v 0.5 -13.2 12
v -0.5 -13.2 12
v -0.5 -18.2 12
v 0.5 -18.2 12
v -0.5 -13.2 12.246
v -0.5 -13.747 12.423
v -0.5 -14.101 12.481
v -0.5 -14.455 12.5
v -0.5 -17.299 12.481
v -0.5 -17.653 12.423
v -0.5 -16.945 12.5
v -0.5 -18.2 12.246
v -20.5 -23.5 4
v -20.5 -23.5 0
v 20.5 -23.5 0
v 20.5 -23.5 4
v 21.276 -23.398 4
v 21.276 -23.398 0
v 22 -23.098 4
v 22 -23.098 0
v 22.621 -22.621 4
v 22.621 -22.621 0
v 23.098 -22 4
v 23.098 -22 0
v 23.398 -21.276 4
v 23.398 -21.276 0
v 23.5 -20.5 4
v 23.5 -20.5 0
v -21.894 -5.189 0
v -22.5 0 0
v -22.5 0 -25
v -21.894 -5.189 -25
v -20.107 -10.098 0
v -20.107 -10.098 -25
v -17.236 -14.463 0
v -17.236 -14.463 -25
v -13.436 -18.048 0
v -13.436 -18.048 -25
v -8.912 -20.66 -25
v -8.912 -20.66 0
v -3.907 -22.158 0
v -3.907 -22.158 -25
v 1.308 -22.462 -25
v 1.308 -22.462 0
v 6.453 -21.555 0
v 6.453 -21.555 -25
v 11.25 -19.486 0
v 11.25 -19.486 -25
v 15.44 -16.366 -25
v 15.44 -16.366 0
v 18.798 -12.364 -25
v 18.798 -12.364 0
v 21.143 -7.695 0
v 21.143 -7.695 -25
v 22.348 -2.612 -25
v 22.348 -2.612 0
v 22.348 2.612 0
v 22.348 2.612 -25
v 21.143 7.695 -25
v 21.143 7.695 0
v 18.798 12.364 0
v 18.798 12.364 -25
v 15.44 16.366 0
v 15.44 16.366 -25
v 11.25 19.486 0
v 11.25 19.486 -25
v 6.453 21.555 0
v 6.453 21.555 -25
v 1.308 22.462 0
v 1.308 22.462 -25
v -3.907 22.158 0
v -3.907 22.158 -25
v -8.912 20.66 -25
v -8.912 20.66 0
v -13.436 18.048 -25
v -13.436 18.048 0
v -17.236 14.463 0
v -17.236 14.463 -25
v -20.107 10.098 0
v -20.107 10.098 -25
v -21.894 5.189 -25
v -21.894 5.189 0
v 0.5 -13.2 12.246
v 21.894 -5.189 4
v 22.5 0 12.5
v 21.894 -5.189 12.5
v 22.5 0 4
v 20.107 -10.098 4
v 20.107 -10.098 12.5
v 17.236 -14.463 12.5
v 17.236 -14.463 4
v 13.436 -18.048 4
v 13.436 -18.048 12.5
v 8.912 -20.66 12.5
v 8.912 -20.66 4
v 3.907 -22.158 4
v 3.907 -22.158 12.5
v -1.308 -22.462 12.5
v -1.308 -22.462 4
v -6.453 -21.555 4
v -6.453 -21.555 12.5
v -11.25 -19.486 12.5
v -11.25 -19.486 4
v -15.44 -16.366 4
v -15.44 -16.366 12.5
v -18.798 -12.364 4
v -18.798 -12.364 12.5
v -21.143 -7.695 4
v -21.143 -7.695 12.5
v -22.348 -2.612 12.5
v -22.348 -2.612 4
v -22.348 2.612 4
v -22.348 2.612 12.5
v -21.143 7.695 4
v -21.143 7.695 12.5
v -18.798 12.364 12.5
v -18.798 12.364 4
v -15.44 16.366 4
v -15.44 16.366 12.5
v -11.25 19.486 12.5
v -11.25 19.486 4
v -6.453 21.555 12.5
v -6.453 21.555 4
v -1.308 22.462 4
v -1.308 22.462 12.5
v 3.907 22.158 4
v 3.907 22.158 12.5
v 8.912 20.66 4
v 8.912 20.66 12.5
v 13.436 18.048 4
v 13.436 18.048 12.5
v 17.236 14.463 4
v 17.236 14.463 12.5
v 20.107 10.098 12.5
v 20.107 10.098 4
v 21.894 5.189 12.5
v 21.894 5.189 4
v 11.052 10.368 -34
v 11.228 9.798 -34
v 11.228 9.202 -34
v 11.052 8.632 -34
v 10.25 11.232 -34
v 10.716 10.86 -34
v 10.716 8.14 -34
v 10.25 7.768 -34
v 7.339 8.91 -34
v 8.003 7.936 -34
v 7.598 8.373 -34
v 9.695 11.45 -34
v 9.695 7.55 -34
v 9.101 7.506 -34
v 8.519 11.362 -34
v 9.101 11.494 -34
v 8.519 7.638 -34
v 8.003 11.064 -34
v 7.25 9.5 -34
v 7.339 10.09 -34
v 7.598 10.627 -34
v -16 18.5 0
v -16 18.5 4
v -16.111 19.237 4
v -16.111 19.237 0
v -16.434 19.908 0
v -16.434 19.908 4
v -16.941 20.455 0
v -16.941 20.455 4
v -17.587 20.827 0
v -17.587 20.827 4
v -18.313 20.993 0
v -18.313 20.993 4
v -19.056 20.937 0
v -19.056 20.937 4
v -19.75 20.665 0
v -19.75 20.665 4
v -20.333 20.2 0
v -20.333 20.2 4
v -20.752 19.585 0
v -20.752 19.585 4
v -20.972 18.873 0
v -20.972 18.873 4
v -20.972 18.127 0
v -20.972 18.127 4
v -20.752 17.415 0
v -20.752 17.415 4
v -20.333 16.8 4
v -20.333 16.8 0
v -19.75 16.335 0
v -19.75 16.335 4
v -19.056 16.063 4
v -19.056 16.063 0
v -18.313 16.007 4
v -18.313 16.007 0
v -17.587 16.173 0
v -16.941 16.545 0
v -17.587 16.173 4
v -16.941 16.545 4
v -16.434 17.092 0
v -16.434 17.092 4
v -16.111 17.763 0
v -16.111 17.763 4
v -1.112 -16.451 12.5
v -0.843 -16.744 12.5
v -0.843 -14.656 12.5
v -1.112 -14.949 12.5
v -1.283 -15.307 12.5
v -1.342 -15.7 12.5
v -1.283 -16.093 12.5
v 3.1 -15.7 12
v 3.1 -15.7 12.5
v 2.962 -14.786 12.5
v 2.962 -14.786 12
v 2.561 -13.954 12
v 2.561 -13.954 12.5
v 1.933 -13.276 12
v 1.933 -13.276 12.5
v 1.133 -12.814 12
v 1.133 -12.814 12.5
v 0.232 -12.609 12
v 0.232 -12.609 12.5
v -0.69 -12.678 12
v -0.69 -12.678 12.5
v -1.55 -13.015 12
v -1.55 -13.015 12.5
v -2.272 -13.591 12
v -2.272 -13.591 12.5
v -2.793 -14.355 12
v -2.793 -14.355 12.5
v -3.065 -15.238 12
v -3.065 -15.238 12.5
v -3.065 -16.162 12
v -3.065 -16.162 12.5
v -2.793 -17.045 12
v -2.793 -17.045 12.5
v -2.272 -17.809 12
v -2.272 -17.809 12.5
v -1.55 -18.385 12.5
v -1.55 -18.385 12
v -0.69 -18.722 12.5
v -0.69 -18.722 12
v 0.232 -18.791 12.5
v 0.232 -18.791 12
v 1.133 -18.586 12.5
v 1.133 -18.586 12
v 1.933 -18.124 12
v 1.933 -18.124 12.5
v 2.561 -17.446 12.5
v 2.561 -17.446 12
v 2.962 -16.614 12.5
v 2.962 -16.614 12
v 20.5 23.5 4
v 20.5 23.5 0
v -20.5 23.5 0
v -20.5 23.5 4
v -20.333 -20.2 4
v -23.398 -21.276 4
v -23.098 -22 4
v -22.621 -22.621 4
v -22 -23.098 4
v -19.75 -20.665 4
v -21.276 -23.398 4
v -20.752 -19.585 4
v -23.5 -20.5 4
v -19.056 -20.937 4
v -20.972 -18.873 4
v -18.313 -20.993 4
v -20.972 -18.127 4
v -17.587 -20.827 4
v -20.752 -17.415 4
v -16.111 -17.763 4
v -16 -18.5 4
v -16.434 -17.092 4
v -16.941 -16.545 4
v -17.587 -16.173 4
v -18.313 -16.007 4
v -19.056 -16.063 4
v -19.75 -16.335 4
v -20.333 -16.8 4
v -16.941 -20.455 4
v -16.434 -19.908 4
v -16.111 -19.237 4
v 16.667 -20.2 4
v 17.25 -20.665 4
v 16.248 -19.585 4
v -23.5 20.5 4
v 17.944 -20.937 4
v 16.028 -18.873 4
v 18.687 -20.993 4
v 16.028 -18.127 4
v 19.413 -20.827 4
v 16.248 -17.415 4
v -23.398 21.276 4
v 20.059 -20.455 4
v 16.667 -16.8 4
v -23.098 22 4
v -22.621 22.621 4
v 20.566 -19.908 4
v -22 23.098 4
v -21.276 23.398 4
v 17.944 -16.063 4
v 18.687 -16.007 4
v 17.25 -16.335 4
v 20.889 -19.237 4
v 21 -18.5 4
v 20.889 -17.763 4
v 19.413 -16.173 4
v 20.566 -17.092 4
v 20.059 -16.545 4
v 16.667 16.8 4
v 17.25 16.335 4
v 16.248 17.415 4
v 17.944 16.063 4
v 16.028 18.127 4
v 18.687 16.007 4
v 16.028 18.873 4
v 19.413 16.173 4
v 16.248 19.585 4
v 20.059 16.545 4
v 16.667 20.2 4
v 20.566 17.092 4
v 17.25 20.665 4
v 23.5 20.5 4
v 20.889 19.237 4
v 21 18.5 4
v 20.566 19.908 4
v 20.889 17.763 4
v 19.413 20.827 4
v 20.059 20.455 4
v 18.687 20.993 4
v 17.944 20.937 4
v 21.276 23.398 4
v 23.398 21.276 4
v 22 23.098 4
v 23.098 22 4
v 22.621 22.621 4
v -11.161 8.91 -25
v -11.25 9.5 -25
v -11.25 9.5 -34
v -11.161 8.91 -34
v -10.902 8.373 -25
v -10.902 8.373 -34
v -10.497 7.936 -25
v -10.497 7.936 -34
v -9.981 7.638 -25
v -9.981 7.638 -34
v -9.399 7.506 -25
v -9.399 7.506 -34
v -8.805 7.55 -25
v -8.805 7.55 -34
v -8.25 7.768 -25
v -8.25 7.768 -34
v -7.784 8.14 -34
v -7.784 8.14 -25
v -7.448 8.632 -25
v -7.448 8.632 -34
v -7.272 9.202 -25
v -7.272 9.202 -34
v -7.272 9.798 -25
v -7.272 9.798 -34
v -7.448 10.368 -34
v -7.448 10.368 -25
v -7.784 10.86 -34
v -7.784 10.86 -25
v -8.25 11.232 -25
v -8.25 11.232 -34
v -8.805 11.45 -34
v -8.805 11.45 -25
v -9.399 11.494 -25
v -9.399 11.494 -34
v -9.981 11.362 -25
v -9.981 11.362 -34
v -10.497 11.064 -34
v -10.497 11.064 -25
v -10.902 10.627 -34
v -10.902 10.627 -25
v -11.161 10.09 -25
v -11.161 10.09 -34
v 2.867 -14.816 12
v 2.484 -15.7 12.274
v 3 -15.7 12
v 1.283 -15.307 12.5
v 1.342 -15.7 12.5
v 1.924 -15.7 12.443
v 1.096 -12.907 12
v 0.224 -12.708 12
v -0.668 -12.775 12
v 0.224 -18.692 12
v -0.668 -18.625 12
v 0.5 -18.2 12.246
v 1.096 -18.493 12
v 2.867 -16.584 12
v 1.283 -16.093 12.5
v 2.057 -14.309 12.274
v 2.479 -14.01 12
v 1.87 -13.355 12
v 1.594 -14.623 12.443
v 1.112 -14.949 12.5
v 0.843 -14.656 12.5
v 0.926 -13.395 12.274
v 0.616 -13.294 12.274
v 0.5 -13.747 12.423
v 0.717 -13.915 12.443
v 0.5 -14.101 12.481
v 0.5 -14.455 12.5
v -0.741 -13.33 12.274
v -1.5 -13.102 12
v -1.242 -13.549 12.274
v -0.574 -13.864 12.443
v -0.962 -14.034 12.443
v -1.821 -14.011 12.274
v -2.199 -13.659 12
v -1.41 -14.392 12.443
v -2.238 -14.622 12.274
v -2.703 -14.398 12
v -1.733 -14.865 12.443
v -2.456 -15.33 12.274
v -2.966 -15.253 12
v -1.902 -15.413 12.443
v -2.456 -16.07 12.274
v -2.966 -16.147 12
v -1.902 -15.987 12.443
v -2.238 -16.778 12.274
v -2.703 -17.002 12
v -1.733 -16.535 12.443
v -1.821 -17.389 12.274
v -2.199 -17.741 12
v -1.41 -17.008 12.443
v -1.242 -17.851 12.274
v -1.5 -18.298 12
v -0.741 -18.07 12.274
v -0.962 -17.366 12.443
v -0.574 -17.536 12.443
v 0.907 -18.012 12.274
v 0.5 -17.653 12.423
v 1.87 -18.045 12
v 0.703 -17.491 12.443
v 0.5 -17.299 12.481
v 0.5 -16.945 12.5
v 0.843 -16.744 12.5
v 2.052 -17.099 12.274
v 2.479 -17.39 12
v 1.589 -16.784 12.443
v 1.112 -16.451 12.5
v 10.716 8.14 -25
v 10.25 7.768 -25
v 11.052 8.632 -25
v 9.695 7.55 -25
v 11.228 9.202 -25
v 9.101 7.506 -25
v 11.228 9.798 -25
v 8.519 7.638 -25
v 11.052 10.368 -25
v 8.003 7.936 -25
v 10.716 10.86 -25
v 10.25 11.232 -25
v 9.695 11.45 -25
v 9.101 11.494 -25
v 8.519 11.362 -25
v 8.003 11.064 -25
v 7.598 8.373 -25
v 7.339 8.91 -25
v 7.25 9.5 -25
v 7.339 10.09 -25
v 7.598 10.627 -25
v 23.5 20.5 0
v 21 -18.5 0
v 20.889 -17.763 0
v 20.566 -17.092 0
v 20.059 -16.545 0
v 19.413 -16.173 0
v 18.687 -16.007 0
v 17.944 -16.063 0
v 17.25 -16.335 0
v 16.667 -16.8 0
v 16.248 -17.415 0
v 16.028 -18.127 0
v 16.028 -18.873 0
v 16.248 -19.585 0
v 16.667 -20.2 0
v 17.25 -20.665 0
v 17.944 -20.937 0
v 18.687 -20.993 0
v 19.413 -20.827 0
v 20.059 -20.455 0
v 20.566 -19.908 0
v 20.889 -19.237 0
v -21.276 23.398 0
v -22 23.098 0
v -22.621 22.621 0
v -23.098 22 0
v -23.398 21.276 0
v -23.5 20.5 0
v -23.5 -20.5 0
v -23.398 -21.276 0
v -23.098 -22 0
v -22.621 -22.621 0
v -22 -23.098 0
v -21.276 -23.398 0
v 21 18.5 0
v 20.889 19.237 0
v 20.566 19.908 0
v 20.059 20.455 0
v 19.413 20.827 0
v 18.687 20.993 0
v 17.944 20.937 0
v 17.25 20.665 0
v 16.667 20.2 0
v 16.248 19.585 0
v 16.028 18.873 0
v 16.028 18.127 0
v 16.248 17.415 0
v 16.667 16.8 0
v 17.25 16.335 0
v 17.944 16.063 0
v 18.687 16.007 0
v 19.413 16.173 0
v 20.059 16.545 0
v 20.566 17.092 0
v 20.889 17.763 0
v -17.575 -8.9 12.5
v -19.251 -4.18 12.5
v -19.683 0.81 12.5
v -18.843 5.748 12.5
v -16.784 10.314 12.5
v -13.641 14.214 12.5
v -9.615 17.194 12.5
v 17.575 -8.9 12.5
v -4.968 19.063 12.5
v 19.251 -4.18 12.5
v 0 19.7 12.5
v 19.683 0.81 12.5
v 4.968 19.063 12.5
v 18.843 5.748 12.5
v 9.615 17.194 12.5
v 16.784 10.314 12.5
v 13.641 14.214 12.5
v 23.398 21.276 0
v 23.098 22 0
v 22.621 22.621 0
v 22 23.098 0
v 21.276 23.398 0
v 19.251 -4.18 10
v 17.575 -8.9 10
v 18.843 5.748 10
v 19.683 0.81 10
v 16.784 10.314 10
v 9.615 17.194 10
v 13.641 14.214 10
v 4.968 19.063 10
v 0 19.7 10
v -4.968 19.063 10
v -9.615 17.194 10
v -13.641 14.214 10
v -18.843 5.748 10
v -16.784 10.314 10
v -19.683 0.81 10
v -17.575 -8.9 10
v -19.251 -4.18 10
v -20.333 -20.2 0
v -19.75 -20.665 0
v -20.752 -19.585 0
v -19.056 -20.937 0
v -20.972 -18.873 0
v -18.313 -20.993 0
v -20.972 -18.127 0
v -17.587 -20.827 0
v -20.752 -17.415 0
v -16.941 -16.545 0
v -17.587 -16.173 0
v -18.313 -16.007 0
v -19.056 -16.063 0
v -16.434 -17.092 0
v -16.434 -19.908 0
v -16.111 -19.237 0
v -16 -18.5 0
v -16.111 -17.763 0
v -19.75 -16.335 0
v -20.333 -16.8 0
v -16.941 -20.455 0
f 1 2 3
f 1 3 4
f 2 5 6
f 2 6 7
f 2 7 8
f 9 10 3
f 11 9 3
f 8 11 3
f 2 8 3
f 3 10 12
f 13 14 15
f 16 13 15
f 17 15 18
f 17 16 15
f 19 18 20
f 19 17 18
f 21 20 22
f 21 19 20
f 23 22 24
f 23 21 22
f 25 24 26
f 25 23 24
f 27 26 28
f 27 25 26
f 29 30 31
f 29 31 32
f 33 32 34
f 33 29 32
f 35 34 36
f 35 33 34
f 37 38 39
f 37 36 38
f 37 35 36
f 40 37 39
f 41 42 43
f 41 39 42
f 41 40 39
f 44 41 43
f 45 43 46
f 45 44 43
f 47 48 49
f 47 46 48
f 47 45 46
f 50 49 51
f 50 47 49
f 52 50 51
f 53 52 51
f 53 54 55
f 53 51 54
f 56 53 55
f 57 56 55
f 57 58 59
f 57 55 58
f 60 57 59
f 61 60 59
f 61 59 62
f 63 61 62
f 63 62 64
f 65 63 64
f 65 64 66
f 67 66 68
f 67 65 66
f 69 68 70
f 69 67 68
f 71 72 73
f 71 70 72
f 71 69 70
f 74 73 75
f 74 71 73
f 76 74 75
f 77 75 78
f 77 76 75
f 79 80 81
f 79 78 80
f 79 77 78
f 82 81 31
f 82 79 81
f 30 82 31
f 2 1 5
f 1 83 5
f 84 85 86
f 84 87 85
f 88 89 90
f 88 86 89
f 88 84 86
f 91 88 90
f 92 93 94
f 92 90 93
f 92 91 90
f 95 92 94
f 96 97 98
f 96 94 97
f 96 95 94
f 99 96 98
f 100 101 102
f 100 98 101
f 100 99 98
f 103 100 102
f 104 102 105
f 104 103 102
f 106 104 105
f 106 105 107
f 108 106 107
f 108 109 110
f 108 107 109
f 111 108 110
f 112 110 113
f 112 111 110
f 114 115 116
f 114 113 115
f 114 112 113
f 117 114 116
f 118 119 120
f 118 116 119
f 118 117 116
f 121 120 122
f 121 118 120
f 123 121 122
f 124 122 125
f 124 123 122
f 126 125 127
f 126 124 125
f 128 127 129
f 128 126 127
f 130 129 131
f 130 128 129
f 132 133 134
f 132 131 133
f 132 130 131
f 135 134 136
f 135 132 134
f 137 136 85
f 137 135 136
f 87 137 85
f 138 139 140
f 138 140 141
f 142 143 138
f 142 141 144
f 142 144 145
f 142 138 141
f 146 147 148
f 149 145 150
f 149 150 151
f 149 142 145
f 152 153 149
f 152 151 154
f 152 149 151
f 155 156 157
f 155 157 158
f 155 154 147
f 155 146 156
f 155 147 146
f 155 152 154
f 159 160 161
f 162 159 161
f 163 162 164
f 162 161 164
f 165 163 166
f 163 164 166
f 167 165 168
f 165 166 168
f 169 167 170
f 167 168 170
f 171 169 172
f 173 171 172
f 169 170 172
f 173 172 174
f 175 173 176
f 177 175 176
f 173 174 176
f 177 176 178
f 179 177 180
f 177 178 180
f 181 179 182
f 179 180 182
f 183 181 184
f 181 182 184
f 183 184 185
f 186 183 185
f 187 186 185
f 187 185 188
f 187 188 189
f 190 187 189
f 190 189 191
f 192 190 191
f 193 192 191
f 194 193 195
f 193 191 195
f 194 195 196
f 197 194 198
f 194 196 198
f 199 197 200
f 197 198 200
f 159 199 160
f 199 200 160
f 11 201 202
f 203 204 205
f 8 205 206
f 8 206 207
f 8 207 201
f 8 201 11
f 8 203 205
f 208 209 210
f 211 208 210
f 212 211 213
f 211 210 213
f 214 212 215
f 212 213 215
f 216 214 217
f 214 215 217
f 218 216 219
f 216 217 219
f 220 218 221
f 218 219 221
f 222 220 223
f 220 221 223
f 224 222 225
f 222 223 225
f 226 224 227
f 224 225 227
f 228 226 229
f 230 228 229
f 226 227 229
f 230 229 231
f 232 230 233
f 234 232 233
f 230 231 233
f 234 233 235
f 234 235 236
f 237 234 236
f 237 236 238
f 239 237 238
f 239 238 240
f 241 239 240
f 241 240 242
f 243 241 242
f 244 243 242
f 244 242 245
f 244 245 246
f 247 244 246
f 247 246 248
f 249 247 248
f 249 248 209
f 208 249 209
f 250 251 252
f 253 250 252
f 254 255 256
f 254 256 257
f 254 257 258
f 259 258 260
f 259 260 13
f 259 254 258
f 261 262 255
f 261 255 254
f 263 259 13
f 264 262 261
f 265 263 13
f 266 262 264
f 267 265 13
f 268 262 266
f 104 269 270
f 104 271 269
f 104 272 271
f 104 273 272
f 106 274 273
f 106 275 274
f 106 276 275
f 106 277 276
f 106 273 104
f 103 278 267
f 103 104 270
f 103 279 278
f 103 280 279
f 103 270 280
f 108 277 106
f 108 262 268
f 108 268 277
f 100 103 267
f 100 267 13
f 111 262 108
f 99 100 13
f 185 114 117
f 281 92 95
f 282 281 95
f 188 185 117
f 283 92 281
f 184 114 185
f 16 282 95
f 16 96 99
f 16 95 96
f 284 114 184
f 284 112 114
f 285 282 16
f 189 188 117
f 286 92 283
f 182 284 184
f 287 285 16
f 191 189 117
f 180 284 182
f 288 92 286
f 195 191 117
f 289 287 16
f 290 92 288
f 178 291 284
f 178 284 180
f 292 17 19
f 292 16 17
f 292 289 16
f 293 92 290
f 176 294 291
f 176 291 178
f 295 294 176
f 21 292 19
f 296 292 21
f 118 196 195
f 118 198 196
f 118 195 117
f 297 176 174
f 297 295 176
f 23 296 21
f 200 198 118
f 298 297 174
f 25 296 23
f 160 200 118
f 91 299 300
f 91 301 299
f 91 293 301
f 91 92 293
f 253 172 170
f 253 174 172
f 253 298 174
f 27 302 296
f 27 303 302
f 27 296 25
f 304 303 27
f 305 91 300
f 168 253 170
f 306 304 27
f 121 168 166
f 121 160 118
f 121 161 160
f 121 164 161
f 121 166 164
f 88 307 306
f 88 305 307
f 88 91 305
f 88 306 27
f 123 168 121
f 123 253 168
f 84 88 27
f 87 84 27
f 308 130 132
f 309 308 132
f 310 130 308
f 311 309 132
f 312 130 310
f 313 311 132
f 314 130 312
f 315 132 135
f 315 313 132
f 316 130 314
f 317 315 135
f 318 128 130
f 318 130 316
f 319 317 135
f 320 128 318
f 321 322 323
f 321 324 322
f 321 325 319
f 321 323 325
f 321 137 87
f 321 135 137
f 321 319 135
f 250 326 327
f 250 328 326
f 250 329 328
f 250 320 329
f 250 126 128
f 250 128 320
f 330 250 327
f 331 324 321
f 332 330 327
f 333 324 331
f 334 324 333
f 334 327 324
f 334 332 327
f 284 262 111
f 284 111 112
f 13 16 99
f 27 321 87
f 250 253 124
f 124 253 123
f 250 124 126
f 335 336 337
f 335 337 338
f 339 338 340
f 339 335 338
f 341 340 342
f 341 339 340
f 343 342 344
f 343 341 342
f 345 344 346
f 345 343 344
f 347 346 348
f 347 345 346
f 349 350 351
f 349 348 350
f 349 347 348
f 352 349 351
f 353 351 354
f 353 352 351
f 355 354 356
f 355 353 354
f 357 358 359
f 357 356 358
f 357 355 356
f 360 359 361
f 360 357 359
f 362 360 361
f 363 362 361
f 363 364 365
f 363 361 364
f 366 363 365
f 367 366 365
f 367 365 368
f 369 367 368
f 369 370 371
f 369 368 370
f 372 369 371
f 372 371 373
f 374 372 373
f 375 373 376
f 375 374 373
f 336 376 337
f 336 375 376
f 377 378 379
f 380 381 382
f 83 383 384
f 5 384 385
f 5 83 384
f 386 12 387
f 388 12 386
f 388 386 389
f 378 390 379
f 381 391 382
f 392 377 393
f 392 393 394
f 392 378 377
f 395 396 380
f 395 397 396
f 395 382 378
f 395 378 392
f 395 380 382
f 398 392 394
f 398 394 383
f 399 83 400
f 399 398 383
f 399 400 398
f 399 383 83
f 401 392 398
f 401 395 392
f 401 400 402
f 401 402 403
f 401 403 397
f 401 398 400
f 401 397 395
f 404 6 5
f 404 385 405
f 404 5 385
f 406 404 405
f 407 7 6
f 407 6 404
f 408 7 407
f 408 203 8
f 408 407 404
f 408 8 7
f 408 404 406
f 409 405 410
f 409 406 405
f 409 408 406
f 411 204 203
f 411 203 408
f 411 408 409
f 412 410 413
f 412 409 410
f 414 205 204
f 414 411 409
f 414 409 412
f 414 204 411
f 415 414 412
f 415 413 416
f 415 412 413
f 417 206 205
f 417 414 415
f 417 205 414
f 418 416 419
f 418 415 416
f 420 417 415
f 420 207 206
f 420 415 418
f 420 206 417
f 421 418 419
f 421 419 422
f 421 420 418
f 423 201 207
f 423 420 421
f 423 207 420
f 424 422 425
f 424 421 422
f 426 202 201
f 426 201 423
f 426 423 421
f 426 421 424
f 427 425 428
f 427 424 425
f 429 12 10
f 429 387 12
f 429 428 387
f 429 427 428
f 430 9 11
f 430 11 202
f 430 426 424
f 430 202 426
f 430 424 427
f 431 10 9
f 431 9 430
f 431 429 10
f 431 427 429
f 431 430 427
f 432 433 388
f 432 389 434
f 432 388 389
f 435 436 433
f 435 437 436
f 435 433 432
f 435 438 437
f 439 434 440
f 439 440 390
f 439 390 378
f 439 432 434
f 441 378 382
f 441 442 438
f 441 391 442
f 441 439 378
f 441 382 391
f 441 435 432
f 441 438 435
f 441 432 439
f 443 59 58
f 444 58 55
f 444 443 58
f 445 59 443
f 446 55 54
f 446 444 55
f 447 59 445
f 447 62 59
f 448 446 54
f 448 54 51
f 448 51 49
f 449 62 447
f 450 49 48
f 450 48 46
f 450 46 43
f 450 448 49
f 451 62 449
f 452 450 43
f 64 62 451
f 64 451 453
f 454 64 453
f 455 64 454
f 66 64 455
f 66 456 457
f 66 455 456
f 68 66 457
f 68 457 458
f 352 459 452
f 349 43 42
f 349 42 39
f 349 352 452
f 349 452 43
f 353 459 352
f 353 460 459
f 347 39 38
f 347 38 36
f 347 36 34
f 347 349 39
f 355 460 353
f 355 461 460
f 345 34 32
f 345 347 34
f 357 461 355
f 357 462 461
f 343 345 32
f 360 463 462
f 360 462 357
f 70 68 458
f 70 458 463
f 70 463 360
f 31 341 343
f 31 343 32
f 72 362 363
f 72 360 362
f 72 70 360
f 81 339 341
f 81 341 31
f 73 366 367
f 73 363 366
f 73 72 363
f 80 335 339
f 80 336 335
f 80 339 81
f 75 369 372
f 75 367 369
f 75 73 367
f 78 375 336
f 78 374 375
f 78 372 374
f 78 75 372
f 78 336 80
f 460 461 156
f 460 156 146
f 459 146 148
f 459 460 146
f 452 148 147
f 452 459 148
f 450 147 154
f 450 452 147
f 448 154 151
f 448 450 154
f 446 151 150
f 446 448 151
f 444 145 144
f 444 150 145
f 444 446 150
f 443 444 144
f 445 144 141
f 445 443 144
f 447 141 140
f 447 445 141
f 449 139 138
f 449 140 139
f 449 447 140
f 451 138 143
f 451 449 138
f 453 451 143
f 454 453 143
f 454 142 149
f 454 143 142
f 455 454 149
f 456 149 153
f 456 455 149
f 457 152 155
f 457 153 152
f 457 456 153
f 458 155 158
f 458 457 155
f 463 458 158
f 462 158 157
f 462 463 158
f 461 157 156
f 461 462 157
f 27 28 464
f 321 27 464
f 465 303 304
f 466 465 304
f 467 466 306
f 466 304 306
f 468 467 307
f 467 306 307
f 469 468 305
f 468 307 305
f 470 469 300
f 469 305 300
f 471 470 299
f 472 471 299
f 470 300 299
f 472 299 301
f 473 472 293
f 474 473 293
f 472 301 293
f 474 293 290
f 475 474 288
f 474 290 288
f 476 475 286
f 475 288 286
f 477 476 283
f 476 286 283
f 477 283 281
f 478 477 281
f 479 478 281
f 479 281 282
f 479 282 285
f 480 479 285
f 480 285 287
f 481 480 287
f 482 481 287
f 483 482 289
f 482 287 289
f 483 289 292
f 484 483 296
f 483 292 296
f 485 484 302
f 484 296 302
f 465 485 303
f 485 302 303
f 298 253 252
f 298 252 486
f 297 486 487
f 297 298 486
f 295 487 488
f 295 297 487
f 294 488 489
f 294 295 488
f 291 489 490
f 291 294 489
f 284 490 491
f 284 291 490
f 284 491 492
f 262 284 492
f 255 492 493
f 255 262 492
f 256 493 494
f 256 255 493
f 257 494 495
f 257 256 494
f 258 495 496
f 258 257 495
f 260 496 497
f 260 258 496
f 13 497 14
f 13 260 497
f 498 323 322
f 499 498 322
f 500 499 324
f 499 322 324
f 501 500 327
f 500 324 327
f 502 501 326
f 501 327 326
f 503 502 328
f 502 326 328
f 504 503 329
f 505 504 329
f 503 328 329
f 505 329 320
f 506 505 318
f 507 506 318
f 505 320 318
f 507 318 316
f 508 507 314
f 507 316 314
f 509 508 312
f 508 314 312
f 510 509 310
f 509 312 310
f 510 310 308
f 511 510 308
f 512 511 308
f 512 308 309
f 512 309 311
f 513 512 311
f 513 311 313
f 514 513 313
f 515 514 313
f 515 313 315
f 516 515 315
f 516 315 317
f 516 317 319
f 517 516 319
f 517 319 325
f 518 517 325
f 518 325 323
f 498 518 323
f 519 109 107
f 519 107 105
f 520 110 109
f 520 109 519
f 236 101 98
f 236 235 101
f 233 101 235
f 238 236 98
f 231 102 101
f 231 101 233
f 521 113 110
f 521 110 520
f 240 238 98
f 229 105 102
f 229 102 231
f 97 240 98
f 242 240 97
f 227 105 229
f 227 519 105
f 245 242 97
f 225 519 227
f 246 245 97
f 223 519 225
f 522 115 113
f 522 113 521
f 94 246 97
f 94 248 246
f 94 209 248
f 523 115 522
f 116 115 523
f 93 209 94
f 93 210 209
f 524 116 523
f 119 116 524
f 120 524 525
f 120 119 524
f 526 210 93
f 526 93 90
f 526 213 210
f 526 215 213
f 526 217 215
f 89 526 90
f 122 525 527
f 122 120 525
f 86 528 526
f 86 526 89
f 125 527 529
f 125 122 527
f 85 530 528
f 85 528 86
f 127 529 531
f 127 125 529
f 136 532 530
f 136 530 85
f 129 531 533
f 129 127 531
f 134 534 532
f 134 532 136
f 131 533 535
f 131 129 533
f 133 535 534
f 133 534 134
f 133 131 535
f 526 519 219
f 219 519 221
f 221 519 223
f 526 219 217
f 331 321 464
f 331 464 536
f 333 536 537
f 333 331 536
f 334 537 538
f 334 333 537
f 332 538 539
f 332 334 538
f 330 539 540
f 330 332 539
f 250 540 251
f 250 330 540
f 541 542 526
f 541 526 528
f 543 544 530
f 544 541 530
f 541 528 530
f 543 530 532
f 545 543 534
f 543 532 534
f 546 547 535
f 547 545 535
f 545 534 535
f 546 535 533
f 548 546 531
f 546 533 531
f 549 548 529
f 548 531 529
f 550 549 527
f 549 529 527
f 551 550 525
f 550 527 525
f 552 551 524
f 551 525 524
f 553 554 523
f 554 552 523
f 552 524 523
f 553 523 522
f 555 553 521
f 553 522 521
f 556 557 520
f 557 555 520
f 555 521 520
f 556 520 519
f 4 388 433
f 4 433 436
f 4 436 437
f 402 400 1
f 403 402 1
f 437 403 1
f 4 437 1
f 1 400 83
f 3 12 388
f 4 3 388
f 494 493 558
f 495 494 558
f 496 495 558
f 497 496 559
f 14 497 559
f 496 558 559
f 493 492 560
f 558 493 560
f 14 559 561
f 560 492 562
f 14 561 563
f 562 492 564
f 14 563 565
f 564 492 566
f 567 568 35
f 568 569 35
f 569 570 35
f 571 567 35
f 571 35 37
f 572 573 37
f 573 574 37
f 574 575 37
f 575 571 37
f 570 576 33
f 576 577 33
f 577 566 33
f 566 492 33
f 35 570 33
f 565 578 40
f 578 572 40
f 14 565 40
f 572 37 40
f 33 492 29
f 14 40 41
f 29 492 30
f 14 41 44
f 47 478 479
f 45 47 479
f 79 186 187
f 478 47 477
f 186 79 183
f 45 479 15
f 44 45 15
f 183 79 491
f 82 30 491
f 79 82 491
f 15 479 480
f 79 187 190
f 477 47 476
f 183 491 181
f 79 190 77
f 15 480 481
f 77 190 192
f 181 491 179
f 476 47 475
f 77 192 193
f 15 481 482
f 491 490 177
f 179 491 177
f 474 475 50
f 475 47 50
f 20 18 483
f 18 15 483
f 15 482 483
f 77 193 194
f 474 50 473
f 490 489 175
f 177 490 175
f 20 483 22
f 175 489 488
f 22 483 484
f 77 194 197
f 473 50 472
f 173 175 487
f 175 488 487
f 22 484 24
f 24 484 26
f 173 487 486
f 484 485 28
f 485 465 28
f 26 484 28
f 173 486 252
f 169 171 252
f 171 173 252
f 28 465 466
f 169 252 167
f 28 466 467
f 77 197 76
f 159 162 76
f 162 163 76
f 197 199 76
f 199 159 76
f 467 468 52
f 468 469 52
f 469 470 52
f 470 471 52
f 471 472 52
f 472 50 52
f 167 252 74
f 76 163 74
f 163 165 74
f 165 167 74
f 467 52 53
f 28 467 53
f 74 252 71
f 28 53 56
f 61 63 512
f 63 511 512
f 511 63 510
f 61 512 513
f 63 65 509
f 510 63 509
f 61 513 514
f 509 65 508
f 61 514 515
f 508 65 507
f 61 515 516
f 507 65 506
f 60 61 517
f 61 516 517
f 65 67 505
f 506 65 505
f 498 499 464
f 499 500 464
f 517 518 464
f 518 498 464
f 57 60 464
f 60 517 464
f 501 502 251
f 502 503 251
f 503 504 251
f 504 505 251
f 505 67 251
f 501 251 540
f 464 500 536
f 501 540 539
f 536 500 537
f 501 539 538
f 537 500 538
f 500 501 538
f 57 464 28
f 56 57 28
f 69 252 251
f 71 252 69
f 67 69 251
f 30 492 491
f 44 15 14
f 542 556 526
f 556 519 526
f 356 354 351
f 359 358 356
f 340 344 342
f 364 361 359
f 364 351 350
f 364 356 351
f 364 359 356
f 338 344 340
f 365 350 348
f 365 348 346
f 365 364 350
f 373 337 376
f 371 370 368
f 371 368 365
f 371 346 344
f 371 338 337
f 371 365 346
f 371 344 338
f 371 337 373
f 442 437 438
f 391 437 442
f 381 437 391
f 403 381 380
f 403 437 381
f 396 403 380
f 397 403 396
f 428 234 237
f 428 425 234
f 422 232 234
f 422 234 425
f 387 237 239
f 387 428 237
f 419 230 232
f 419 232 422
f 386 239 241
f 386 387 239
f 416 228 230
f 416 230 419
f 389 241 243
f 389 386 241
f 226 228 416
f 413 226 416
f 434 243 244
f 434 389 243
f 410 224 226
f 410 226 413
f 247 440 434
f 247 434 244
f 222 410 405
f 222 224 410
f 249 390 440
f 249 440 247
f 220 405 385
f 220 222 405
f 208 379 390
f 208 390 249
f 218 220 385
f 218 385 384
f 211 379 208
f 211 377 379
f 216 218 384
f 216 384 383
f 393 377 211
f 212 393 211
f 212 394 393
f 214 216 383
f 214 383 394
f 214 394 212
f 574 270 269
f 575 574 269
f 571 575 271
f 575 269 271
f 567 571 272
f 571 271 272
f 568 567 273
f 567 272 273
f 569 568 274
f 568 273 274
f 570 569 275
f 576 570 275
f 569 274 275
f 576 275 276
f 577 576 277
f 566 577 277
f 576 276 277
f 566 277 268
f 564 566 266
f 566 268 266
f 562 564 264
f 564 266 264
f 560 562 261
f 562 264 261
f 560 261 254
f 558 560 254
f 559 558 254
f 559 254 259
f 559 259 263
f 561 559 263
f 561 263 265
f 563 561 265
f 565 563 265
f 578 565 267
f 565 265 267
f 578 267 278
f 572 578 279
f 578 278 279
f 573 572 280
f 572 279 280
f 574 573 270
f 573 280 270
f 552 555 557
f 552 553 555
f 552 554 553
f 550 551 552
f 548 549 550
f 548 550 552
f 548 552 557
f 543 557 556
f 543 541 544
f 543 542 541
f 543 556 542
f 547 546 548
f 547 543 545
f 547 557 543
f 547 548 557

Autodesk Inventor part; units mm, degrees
ref_plane "YZ Plane" through (0, 0, 0) normal (1, 0, 0) x (0, 1, 0)
ref_plane "XZ Plane" through (0, 0, 0) normal (0, 1, 0) x (-1, 0, 0)
ref_plane "XY Plane" through (0, 0, 0) normal (0, 0, 1) x (1, 0, 0)
sketch "Base" plane through (0, 0, 0) normal (0, 0, 1) x (1, 0, 0)
  line L0 (-23.5, -23.5) -> (23.5, -23.5)
  line L1 (23.5, -23.5) -> (23.5, 23.5)
  line L2 (23.5, 23.5) -> (-23.5, 23.5)
  line L3 (-23.5, 23.5) -> (-23.5, -23.5)
  line L4 (-23.5, -23.5) -> (23.5, 23.5) construction
  line L5 (23.5, -23.5) -> (-23.5, 23.5) construction
  point P0 (0, 0)
  dimension "d0" = 47
extrude "BaseFeature" add sketch "Base" along normal blind 4
fillet "FilletsFeature" radius 3 4 edges at (-23.5, -23.5, 2) (-23.5, 23.5, 2) (23.5, -23.5, 2) (23.5, 23.5, 2)
sketch "Front" plane through (0, 0, 4) normal (0, 0, 1) x (1, 0, 0)
  circle A0 centre (0, 0) radius 22.5
  dimension "d4" = 45
extrude "FrontFeature" add sketch "Front" along normal blind 8.5
sketch "Screen" plane through (0, 0, 12.5) normal (0, 0, 1) x (1, 0, 0)
  circle A0 centre (0, 0) radius 19.7
  circle A1 centre (0, 0) radius 22.5 projected
  line L0 (-17.575, -8.9) -> (17.575, -8.9)
  line L1 (0, -8.9) -> (0, -19.7) construction
  dimension "d7" = 2.8
  dimension "d8" = 10.8
extrude "ScreenFEature" cut sketch "Screen" against normal blind 2.5 contours A0 L0 picked at (4.7799, 0.8366)
sketch "ScrewHole" plane through (0, 0, 12.5) normal (0, 0, 1) x (1, 0, 0)
  line L0 (17.575, -8.9) -> (-17.575, -8.9) projected
  line L1 (0, -8.9) -> (0, -22.5) construction
  circle A0 centre (0, 0) radius 22.5 projected
  circle A1 centre (0, -15.7) radius 3
  circle A2 centre (0, -15.7) radius 3.1
  dimension "d11" = 6
  dimension "d12" = 0.1
extrude "ScrewHoleFeature" cut sketch "ScrewHole" against normal blind 0.5 contours A1 | A2
sketch "ScrewHead" plane through (0, -15.7, 12) normal (0, 0, 1) x (1, 0, 0)
  circle A0 centre (0, 0) radius 3
  circle A1 centre (0, 0) radius 3.1 projected
  point P0 (0, 15.7)
  dimension "d15" = 6
extrude "ScrewHeadFeature" add sketch "ScrewHead" along normal blind 0.5 contours A0
fillet "ScrewHeadFilletFeature" radius 3 1 edges at (-3, -15.7, 12.5)
sketch "ScrewFlat" plane through (0, -15.7, 12.5) normal (0, 0, 1) x (1, 0, 0)
  circle A0 centre (0, 0) radius 3 projected
  line L0 (0, 3) -> (0, -3) construction
  line L1 (-0.5, -2.5) -> (0.5, -2.5)
  line L2 (0.5, -2.5) -> (0.5, 2.5)
  line L3 (0.5, 2.5) -> (-0.5, 2.5)
  line L4 (-0.5, 2.5) -> (-0.5, -2.5)
  circle A1 centre (0, 0) radius 1.3417 projected
  line L5 (-0.5, -2.5) -> (0.5, 2.5) construction
  line L6 (0.5, -2.5) -> (-0.5, 2.5) construction
  point P0 (0, 15.7)
  dimension "d19" = 5
  dimension "d20" = 1
extrude "ScrewFlatFeature" cut sketch "ScrewFlat" against normal blind 0.5 contours L4 A1 L2 L1 | L4 A1 L2 | L4 L3 L2 A1
sketch "MountHoles" plane through (0, 0, 4) normal (0, 0, 1) x (1, 0, 0)
  circle A0 centre (-18.5, -18.5) radius 2.5
  line L0 (-32.9, 0) -> (32.9, 0) projected
  line L1 (0, -32.9) -> (0, 32.9) projected
  circle A1 centre (18.5, -18.5) radius 2.5
  circle A2 centre (-18.5, 18.5) radius 2.5
  circle A3 centre (18.5, 18.5) radius 2.5
  point P0 (0, 0)
  dimension "d23" = 5
  dimension "d24" = 37
  dimension "d25" = 37
extrude "MountHolesFeature" cut sketch "MountHoles" against normal through all
sketch "Body" plane through (0, 0, 0) normal (0, 0, -1) x (-1, 0, 0)
  circle A0 centre (0, 0) radius 22.5 projected
extrude "BodyFeature" add sketch "Body" along normal blind 25
sketch "Studs" plane through (0, 0, -25) normal (0, 0, -1) x (-1, 0, 0)
  circle A0 centre (0, 0) radius 22.5 projected
  line L0 (-21.2132, 7.5) -> (21.2132, 7.5) construction
  circle A1 centre (9.25, 9.5) radius 2
  line L1 (0, -32.9) -> (0, 32.9) construction
  circle A2 centre (-9.25, 9.5) radius 2
  line L2 (9.25, 9.5) -> (9.25, 7.5) construction
  line L3 (-9.25, 9.5) -> (-11.25, 9.5) construction
  line L4 (9.25, 9.5) -> (11.25, 9.5) construction
  point P0 (0, 22.5)
  dimension "d32" = 4
  dimension "d30" = 15
  dimension "d31" = 22.5
extrude "StudsFeature" add sketch "Studs" along normal blind 9 contours A1 | A2
equation "\"d25\" = d24"
properties part number "BaomanACPanelMountMeter"
